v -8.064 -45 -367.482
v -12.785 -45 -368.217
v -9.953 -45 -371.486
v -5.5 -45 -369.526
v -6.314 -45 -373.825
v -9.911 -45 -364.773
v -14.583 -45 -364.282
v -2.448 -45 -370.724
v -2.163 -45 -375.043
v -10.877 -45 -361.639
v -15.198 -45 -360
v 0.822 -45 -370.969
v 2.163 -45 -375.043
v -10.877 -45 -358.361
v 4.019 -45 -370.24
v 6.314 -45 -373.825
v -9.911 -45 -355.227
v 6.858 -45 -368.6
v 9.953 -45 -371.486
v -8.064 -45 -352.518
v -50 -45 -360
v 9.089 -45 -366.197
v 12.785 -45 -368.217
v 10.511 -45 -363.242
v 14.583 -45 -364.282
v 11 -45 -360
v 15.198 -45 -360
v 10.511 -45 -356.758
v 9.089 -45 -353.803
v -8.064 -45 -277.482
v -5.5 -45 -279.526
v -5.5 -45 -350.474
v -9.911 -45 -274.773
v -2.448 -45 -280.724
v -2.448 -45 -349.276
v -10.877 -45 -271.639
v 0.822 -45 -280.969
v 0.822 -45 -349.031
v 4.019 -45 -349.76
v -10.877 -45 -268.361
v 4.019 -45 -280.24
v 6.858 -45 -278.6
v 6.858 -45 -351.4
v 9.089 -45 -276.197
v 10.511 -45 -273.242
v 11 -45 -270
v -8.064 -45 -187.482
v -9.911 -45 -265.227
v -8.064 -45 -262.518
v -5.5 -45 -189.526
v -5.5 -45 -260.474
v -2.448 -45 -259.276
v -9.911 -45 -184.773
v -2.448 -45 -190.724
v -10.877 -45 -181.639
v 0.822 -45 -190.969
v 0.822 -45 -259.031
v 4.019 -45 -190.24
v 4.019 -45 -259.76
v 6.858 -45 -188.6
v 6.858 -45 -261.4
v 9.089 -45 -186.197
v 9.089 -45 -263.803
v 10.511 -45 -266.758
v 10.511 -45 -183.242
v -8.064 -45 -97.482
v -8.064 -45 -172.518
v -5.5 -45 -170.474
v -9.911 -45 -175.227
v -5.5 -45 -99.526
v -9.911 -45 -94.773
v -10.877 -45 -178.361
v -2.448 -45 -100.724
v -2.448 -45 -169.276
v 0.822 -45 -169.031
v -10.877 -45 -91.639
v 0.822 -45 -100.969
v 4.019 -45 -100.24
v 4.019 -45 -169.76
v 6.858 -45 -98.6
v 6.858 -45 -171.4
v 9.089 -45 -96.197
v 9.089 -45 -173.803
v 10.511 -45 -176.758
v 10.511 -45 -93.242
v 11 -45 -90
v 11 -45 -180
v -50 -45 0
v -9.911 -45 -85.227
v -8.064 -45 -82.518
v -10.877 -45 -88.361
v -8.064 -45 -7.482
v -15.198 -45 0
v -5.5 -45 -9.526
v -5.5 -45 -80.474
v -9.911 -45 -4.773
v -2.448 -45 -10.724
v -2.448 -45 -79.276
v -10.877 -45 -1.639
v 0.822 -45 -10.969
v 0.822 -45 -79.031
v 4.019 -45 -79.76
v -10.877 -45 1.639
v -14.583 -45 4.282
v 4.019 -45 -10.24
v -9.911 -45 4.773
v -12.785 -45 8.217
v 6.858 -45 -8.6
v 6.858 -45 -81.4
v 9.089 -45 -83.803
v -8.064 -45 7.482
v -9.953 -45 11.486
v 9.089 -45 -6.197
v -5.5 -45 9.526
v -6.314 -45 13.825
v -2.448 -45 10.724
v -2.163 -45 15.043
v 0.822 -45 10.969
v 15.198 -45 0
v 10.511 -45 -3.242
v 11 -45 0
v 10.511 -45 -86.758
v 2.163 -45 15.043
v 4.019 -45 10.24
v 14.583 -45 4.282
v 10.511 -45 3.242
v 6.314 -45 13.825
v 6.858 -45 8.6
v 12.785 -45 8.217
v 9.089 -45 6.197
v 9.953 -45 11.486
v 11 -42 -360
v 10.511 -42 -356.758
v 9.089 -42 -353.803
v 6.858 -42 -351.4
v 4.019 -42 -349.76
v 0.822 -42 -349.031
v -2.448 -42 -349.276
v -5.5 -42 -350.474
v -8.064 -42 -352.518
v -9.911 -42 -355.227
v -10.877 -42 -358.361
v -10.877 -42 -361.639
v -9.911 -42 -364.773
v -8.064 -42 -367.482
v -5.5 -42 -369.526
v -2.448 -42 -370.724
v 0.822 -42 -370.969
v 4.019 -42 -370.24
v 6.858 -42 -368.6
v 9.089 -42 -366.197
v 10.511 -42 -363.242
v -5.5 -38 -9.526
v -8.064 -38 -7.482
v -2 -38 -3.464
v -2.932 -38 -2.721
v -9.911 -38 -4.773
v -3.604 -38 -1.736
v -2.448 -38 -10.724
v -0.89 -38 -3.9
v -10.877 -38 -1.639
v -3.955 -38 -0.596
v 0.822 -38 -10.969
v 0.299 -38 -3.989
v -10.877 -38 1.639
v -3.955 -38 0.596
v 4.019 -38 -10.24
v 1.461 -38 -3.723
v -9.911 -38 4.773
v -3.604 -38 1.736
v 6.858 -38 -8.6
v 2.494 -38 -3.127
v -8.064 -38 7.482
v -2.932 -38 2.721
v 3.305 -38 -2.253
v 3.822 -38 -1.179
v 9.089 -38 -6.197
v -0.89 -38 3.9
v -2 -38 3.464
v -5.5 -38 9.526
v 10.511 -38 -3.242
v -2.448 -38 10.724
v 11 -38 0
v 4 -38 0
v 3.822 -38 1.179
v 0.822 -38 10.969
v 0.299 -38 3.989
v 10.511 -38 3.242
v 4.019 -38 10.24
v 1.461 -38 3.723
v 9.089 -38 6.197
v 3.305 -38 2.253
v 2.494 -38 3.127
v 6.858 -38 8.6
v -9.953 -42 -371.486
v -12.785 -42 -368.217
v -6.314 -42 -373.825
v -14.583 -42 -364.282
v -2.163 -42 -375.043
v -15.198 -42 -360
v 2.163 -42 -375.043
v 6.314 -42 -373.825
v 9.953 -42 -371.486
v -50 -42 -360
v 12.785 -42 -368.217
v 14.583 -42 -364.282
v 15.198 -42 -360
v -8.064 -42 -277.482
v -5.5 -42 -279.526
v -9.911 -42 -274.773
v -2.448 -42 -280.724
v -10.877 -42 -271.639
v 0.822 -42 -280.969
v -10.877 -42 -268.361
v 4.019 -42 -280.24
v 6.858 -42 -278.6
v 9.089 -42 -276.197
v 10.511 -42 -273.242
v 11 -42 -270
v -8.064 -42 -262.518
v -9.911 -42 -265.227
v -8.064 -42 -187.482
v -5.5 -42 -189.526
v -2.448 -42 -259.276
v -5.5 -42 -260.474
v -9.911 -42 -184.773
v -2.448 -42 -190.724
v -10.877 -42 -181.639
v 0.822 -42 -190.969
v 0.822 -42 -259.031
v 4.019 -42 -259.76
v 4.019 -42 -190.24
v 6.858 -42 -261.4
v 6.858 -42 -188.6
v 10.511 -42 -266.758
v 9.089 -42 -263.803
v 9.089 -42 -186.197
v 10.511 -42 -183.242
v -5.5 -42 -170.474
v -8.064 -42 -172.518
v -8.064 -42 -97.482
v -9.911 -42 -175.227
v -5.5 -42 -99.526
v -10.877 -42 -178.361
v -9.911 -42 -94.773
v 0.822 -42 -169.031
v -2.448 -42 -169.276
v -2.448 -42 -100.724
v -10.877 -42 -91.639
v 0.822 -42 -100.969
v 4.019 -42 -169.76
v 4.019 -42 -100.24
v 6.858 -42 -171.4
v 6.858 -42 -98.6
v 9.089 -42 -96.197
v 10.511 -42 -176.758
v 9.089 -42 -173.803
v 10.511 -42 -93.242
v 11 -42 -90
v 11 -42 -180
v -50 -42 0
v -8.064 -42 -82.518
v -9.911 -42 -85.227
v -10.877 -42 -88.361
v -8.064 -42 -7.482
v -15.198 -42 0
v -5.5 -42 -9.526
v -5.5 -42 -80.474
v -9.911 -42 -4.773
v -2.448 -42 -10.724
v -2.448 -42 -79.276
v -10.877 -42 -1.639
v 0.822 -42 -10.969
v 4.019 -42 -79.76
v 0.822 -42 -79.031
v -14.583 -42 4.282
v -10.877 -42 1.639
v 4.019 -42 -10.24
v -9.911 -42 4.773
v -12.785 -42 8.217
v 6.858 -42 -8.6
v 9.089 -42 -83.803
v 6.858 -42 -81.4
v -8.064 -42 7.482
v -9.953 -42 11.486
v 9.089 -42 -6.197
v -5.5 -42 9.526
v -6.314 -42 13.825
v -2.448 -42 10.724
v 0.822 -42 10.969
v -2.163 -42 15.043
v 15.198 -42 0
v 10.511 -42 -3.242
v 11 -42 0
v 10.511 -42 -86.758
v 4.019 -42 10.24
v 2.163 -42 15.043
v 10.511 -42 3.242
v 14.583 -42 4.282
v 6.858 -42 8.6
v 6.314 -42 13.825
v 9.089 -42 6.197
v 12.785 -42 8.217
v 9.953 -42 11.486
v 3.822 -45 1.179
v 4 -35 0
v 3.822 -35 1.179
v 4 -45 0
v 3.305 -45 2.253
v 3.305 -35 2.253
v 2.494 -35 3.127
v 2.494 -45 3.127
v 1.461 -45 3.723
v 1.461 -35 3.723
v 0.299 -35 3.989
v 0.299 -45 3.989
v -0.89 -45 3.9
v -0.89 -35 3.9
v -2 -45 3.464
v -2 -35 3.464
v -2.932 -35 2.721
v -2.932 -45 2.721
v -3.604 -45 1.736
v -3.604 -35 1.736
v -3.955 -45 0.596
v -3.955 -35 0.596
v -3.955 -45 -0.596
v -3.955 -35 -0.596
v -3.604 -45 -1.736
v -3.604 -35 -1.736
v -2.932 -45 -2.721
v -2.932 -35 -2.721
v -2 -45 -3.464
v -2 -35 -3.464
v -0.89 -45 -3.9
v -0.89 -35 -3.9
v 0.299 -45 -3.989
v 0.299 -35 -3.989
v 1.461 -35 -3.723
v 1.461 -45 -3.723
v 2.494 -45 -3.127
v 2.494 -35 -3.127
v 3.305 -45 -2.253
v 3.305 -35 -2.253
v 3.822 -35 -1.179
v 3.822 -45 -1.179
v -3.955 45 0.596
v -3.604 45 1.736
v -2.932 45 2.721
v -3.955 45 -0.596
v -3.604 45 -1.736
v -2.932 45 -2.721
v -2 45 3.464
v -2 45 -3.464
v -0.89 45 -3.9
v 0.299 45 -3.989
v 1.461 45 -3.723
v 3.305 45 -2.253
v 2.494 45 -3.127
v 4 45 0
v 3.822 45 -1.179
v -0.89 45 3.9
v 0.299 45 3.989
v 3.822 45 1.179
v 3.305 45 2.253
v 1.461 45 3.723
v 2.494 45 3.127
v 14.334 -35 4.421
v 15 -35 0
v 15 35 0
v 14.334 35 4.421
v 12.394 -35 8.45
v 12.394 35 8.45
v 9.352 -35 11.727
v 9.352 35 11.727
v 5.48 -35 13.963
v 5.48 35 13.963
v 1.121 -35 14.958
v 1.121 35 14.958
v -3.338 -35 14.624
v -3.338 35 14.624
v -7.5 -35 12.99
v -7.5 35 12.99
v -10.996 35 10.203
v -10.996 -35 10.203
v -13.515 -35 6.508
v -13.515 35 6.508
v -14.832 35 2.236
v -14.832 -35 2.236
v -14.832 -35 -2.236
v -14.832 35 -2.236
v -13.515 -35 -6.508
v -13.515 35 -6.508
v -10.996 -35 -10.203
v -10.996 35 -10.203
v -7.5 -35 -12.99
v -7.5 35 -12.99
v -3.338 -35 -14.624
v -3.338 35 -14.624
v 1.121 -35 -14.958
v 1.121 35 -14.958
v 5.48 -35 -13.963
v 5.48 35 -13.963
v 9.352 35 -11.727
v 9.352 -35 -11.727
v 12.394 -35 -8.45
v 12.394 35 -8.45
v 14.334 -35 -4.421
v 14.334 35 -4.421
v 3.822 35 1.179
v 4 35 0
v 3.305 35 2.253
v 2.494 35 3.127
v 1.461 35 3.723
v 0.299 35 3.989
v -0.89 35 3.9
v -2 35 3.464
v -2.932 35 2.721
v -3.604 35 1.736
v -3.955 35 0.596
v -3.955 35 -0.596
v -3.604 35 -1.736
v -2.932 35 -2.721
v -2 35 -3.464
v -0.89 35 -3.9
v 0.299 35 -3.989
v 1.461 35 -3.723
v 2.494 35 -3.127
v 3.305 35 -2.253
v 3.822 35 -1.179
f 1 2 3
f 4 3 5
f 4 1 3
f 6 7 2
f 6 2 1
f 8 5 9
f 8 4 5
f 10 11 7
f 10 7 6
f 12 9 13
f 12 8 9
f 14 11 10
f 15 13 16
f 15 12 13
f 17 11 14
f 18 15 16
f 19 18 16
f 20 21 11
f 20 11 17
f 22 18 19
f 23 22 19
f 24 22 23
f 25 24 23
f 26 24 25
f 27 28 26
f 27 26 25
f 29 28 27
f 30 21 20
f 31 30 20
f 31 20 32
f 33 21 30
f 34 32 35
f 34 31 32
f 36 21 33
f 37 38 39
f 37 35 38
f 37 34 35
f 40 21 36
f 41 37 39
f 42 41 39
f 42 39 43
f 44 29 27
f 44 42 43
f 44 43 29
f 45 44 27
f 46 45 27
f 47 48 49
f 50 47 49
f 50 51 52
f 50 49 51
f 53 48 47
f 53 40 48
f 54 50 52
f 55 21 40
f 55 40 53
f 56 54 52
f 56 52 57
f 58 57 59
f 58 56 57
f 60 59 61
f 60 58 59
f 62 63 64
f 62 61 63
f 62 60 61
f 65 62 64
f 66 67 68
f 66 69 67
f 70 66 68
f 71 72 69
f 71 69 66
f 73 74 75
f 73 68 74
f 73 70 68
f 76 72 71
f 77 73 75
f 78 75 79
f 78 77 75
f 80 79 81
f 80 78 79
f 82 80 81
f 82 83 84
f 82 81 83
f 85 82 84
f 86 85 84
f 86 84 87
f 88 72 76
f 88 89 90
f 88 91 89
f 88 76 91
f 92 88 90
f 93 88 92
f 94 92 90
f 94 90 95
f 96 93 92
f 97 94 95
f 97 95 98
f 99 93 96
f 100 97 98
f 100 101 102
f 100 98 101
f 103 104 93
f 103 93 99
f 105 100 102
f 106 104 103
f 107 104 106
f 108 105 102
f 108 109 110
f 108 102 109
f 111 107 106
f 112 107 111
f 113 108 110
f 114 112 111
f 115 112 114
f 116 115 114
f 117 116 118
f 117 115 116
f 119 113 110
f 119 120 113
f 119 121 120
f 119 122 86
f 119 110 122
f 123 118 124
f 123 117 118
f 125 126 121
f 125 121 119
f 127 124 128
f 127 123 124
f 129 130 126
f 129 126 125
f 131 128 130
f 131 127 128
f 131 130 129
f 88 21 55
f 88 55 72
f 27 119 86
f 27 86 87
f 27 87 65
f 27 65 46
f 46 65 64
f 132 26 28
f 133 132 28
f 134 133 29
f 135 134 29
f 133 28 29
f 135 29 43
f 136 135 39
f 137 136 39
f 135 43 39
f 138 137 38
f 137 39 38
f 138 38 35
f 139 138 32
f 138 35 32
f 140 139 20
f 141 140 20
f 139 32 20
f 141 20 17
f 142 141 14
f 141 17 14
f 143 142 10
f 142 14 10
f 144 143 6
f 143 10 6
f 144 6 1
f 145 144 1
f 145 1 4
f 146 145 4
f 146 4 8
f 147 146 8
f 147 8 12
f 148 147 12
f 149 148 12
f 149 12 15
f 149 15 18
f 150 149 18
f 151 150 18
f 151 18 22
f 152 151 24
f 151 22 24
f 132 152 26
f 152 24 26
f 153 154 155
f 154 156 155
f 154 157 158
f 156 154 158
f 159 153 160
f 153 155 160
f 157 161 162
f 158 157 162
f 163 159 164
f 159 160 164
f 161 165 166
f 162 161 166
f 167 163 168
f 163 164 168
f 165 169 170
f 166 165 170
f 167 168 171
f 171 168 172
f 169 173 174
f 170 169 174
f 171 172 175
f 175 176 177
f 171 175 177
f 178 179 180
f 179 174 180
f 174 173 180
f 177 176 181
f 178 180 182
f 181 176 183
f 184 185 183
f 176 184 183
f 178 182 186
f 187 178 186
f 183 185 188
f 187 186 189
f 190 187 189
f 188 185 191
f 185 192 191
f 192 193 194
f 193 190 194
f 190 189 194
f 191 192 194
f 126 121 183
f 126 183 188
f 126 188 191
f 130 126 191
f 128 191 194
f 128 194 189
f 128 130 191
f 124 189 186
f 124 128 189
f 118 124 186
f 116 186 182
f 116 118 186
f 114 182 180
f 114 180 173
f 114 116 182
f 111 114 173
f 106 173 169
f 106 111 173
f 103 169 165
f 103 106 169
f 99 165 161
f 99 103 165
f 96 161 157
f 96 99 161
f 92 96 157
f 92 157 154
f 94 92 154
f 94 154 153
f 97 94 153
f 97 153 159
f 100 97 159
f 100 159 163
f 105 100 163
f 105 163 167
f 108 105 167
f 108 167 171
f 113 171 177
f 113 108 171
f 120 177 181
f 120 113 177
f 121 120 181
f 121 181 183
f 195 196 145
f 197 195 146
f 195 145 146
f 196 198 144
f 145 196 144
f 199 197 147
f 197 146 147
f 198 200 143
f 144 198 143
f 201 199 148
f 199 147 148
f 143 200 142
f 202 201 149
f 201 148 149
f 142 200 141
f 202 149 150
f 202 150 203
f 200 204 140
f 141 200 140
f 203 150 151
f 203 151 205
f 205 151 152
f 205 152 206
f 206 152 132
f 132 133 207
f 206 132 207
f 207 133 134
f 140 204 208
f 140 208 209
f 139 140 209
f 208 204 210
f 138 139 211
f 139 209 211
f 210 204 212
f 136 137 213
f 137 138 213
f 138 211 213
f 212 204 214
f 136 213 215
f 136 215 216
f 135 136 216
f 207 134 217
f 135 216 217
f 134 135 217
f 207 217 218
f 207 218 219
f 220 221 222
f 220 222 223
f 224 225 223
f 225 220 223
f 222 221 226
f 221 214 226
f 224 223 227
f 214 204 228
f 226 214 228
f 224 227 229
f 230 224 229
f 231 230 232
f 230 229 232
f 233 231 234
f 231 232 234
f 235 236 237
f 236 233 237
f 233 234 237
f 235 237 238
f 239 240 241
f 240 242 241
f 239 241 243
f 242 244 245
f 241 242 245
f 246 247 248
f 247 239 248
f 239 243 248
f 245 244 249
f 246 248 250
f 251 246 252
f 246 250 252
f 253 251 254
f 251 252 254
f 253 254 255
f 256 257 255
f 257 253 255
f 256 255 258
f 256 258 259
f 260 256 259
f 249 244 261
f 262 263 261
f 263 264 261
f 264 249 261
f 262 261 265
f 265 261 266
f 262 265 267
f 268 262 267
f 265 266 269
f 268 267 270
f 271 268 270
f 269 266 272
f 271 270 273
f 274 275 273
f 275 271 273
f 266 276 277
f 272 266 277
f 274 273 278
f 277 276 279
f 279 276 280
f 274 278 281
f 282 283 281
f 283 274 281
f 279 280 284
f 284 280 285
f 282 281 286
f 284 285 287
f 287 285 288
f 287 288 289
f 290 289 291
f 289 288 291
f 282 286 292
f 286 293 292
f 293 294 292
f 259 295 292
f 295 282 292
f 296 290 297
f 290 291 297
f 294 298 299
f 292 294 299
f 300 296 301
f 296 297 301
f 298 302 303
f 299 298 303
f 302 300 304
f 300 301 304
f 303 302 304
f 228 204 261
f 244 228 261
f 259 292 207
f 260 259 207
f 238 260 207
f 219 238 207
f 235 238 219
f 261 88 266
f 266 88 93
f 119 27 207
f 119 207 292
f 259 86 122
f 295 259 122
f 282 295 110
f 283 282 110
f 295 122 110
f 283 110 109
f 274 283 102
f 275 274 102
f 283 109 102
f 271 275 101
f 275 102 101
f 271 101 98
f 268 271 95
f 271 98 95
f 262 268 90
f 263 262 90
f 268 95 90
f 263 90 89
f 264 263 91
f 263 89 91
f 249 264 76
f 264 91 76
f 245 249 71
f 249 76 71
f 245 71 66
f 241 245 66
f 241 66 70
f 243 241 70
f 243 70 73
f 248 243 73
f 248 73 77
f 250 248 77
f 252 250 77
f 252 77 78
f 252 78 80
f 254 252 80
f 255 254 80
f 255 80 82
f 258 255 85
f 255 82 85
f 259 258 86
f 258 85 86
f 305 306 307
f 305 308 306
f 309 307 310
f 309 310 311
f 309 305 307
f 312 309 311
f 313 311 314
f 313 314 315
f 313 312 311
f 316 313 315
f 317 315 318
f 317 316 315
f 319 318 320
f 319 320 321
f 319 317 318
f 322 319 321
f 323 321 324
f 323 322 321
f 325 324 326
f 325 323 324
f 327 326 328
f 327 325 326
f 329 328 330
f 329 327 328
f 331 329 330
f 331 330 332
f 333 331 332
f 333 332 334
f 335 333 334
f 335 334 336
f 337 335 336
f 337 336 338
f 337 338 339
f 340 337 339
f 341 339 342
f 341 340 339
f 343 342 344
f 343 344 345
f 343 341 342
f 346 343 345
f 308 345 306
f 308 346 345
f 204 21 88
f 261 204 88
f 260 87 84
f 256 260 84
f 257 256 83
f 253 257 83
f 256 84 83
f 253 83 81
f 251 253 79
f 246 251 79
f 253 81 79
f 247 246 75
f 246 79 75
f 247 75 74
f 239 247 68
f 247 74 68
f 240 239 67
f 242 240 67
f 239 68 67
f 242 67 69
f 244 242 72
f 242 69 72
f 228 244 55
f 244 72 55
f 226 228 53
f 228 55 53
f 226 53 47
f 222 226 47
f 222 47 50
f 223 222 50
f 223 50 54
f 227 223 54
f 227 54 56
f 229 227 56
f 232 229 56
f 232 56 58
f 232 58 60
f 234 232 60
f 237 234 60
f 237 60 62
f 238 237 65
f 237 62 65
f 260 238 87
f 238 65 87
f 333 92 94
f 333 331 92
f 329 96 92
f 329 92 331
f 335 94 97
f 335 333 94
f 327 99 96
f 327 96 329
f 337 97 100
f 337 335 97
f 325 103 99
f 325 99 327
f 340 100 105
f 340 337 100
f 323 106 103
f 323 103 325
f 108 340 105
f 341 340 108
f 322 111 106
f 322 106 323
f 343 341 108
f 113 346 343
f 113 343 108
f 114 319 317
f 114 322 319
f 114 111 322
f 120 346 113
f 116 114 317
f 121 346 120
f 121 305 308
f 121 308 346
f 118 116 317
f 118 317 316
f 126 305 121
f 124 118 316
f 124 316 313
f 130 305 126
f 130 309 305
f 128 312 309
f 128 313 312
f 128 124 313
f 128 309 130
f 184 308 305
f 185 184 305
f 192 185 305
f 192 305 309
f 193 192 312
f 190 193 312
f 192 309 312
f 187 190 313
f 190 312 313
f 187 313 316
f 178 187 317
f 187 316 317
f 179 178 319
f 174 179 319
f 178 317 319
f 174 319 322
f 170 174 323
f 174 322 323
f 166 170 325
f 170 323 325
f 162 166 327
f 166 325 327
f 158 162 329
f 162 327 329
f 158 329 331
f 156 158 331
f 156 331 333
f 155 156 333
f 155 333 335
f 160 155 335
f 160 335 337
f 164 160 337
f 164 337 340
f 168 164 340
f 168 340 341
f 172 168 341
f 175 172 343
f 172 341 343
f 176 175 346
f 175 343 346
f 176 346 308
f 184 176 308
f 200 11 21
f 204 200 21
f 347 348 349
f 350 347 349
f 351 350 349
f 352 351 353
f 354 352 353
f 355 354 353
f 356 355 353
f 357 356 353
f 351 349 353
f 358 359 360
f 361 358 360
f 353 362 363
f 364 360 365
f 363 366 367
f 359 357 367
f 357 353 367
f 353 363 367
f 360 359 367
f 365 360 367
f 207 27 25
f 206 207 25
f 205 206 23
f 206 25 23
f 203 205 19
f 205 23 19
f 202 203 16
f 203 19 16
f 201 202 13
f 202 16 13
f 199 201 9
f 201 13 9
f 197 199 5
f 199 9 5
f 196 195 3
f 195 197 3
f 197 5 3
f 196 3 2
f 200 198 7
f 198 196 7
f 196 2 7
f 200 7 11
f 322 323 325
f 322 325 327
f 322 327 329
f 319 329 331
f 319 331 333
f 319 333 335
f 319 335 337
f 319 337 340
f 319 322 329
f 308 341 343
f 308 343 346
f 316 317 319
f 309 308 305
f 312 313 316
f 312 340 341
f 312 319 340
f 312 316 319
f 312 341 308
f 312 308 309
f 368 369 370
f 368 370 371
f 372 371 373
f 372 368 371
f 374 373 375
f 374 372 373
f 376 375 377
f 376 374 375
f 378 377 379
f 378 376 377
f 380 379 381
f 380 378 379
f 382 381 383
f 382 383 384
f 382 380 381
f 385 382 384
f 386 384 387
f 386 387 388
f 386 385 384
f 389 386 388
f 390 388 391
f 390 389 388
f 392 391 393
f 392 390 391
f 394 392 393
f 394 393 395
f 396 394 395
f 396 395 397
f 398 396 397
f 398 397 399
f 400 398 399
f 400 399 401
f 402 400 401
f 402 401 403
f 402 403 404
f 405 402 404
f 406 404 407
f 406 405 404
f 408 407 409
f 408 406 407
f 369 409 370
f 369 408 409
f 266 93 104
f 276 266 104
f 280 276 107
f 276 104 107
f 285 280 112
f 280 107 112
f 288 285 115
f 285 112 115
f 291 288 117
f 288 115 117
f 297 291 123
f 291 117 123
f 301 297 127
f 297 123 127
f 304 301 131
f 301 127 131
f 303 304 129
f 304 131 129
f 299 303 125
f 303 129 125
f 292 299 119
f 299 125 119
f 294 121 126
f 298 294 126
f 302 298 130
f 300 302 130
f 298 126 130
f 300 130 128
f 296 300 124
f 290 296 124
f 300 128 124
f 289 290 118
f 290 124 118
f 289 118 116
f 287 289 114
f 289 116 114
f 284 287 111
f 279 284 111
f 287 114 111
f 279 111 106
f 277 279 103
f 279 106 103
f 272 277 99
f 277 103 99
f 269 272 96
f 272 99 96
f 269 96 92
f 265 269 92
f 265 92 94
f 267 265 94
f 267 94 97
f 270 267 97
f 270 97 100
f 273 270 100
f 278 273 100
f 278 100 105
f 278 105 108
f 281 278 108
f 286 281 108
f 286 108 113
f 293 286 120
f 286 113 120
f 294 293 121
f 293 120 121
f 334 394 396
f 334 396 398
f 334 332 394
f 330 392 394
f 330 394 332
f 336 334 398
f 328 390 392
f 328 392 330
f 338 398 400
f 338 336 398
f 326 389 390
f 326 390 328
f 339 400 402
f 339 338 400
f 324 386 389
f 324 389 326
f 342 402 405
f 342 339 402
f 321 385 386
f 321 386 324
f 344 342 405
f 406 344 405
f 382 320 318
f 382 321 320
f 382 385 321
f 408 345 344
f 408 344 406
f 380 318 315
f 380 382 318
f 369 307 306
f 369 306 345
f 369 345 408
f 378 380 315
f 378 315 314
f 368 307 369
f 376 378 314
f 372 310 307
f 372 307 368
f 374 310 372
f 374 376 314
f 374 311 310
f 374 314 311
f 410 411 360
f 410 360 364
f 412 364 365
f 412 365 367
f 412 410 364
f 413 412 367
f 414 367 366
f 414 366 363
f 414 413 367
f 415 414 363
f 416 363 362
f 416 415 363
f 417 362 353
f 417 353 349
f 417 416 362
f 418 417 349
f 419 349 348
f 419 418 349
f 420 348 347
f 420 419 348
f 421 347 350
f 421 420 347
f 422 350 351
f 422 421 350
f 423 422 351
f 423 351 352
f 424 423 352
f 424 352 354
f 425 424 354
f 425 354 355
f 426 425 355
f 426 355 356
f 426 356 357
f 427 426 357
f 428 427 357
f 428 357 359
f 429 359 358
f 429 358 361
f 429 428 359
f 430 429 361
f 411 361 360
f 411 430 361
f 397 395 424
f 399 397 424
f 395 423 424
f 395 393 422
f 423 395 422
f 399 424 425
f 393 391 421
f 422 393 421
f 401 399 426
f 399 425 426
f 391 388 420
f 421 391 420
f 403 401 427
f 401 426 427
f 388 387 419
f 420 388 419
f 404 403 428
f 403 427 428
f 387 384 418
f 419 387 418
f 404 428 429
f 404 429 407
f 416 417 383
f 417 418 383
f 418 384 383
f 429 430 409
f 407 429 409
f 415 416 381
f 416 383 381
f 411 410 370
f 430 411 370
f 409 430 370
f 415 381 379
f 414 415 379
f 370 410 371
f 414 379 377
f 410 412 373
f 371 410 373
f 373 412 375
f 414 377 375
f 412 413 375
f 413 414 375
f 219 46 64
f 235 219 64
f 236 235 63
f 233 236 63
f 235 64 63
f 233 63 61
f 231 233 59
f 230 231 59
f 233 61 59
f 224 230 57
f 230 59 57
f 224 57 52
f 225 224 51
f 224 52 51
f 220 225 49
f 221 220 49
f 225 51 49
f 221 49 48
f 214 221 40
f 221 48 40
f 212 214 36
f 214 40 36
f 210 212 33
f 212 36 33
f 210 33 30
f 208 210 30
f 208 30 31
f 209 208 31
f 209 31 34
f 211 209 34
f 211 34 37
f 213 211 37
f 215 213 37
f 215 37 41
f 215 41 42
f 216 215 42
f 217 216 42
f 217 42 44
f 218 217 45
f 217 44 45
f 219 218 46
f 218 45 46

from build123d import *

# Parameters (mm, degrees)
F0_R     = 4
F1_DEPTH = 45
F3_START = -10
F2_R     = 15
F3_DEPTH = 70
F4_R     = 11
F4_R_2   = 4
F5_DEPTH = 7
F6_W     = 80
F6_H     = 410
F6_R     = 11
F7_DEPTH = 3
F8_W     = 14.8018560397
F8_H     = 360
F9_DEPTH = 25


with BuildPart() as f1:
    # F0 (on Front) → F1 (new body, symmetric)
    with BuildSketch(Plane.XZ):
        Circle(F0_R)
    extrude(amount=F1_DEPTH, both=True)

    # F2 (on face) → F3 (join)
    with BuildSketch(Plane.XZ.offset(45).offset(F3_START)):
        Circle(F2_R)
    extrude(amount=-F3_DEPTH)


with BuildPart() as f5:
    # F4 (on face) → F5 (new body)
    with BuildSketch(Plane.XZ.offset(45)):
        Circle(F4_R)
        Circle(F4_R_2, mode=Mode.SUBTRACT)
    extrude(amount=-F5_DEPTH)


with BuildPart() as f7:
    # F6 (on face) → F7 (new body)
    with BuildSketch(Plane.XZ.offset(45)):
        with Locations((-10, -176.0458183289)):
            Rectangle(F6_W, F6_H)
        with Locations((0, -360)):
            Circle(F6_R, mode=Mode.SUBTRACT)
        with Locations((0, -270)):
            Circle(F6_R, mode=Mode.SUBTRACT)
        with Locations((0, -180)):
            Circle(F6_R, mode=Mode.SUBTRACT)
        with Locations((0, -90)):
            Circle(F6_R, mode=Mode.SUBTRACT)
        Circle(F6_R, mode=Mode.SUBTRACT)
    extrude(amount=-F7_DEPTH)

    # F8 (on face) → F9 (cut)
    with BuildSketch(Plane.XZ.offset(45)):
        with BuildLine():
            ThreePointArc((-15.1981439603, 0), (0, 15.1981439603), (15.1981439603, 0))
            Line((15.1981439603, 0), (30, 0))
            Line((30, 0), (30, 46.0360497236))
            Line((30, 46.0360497236), (-84.6897289157, 56.9662563503))
            Line((-84.6897289157, 56.9662563503), (-90.118749967, 0))
            Line((-90.118749967, 0), (-15.1981439603, 0))
        make_face()
        with Locations((22.5990719802, -180)):
            Rectangle(F8_W, F8_H)
        with BuildLine():
            Line((30, -360), (15.1981439603, -360))
            ThreePointArc((15.1981439603, -360), (0, -375.1981439603), (-15.1981439603, -360))
            Line((-15.1981439603, -360), (-50, -360))
            Line((-50, -360), (-50, -381.0458183289))
            Line((-50, -381.0458183289), (30, -381.0458183289))
            Line((30, -381.0458183289), (30, -360))
        make_face()
    extrude(amount=-F9_DEPTH, mode=Mode.SUBTRACT)


solid = Compound([f1.part, f5.part, f7.part])
